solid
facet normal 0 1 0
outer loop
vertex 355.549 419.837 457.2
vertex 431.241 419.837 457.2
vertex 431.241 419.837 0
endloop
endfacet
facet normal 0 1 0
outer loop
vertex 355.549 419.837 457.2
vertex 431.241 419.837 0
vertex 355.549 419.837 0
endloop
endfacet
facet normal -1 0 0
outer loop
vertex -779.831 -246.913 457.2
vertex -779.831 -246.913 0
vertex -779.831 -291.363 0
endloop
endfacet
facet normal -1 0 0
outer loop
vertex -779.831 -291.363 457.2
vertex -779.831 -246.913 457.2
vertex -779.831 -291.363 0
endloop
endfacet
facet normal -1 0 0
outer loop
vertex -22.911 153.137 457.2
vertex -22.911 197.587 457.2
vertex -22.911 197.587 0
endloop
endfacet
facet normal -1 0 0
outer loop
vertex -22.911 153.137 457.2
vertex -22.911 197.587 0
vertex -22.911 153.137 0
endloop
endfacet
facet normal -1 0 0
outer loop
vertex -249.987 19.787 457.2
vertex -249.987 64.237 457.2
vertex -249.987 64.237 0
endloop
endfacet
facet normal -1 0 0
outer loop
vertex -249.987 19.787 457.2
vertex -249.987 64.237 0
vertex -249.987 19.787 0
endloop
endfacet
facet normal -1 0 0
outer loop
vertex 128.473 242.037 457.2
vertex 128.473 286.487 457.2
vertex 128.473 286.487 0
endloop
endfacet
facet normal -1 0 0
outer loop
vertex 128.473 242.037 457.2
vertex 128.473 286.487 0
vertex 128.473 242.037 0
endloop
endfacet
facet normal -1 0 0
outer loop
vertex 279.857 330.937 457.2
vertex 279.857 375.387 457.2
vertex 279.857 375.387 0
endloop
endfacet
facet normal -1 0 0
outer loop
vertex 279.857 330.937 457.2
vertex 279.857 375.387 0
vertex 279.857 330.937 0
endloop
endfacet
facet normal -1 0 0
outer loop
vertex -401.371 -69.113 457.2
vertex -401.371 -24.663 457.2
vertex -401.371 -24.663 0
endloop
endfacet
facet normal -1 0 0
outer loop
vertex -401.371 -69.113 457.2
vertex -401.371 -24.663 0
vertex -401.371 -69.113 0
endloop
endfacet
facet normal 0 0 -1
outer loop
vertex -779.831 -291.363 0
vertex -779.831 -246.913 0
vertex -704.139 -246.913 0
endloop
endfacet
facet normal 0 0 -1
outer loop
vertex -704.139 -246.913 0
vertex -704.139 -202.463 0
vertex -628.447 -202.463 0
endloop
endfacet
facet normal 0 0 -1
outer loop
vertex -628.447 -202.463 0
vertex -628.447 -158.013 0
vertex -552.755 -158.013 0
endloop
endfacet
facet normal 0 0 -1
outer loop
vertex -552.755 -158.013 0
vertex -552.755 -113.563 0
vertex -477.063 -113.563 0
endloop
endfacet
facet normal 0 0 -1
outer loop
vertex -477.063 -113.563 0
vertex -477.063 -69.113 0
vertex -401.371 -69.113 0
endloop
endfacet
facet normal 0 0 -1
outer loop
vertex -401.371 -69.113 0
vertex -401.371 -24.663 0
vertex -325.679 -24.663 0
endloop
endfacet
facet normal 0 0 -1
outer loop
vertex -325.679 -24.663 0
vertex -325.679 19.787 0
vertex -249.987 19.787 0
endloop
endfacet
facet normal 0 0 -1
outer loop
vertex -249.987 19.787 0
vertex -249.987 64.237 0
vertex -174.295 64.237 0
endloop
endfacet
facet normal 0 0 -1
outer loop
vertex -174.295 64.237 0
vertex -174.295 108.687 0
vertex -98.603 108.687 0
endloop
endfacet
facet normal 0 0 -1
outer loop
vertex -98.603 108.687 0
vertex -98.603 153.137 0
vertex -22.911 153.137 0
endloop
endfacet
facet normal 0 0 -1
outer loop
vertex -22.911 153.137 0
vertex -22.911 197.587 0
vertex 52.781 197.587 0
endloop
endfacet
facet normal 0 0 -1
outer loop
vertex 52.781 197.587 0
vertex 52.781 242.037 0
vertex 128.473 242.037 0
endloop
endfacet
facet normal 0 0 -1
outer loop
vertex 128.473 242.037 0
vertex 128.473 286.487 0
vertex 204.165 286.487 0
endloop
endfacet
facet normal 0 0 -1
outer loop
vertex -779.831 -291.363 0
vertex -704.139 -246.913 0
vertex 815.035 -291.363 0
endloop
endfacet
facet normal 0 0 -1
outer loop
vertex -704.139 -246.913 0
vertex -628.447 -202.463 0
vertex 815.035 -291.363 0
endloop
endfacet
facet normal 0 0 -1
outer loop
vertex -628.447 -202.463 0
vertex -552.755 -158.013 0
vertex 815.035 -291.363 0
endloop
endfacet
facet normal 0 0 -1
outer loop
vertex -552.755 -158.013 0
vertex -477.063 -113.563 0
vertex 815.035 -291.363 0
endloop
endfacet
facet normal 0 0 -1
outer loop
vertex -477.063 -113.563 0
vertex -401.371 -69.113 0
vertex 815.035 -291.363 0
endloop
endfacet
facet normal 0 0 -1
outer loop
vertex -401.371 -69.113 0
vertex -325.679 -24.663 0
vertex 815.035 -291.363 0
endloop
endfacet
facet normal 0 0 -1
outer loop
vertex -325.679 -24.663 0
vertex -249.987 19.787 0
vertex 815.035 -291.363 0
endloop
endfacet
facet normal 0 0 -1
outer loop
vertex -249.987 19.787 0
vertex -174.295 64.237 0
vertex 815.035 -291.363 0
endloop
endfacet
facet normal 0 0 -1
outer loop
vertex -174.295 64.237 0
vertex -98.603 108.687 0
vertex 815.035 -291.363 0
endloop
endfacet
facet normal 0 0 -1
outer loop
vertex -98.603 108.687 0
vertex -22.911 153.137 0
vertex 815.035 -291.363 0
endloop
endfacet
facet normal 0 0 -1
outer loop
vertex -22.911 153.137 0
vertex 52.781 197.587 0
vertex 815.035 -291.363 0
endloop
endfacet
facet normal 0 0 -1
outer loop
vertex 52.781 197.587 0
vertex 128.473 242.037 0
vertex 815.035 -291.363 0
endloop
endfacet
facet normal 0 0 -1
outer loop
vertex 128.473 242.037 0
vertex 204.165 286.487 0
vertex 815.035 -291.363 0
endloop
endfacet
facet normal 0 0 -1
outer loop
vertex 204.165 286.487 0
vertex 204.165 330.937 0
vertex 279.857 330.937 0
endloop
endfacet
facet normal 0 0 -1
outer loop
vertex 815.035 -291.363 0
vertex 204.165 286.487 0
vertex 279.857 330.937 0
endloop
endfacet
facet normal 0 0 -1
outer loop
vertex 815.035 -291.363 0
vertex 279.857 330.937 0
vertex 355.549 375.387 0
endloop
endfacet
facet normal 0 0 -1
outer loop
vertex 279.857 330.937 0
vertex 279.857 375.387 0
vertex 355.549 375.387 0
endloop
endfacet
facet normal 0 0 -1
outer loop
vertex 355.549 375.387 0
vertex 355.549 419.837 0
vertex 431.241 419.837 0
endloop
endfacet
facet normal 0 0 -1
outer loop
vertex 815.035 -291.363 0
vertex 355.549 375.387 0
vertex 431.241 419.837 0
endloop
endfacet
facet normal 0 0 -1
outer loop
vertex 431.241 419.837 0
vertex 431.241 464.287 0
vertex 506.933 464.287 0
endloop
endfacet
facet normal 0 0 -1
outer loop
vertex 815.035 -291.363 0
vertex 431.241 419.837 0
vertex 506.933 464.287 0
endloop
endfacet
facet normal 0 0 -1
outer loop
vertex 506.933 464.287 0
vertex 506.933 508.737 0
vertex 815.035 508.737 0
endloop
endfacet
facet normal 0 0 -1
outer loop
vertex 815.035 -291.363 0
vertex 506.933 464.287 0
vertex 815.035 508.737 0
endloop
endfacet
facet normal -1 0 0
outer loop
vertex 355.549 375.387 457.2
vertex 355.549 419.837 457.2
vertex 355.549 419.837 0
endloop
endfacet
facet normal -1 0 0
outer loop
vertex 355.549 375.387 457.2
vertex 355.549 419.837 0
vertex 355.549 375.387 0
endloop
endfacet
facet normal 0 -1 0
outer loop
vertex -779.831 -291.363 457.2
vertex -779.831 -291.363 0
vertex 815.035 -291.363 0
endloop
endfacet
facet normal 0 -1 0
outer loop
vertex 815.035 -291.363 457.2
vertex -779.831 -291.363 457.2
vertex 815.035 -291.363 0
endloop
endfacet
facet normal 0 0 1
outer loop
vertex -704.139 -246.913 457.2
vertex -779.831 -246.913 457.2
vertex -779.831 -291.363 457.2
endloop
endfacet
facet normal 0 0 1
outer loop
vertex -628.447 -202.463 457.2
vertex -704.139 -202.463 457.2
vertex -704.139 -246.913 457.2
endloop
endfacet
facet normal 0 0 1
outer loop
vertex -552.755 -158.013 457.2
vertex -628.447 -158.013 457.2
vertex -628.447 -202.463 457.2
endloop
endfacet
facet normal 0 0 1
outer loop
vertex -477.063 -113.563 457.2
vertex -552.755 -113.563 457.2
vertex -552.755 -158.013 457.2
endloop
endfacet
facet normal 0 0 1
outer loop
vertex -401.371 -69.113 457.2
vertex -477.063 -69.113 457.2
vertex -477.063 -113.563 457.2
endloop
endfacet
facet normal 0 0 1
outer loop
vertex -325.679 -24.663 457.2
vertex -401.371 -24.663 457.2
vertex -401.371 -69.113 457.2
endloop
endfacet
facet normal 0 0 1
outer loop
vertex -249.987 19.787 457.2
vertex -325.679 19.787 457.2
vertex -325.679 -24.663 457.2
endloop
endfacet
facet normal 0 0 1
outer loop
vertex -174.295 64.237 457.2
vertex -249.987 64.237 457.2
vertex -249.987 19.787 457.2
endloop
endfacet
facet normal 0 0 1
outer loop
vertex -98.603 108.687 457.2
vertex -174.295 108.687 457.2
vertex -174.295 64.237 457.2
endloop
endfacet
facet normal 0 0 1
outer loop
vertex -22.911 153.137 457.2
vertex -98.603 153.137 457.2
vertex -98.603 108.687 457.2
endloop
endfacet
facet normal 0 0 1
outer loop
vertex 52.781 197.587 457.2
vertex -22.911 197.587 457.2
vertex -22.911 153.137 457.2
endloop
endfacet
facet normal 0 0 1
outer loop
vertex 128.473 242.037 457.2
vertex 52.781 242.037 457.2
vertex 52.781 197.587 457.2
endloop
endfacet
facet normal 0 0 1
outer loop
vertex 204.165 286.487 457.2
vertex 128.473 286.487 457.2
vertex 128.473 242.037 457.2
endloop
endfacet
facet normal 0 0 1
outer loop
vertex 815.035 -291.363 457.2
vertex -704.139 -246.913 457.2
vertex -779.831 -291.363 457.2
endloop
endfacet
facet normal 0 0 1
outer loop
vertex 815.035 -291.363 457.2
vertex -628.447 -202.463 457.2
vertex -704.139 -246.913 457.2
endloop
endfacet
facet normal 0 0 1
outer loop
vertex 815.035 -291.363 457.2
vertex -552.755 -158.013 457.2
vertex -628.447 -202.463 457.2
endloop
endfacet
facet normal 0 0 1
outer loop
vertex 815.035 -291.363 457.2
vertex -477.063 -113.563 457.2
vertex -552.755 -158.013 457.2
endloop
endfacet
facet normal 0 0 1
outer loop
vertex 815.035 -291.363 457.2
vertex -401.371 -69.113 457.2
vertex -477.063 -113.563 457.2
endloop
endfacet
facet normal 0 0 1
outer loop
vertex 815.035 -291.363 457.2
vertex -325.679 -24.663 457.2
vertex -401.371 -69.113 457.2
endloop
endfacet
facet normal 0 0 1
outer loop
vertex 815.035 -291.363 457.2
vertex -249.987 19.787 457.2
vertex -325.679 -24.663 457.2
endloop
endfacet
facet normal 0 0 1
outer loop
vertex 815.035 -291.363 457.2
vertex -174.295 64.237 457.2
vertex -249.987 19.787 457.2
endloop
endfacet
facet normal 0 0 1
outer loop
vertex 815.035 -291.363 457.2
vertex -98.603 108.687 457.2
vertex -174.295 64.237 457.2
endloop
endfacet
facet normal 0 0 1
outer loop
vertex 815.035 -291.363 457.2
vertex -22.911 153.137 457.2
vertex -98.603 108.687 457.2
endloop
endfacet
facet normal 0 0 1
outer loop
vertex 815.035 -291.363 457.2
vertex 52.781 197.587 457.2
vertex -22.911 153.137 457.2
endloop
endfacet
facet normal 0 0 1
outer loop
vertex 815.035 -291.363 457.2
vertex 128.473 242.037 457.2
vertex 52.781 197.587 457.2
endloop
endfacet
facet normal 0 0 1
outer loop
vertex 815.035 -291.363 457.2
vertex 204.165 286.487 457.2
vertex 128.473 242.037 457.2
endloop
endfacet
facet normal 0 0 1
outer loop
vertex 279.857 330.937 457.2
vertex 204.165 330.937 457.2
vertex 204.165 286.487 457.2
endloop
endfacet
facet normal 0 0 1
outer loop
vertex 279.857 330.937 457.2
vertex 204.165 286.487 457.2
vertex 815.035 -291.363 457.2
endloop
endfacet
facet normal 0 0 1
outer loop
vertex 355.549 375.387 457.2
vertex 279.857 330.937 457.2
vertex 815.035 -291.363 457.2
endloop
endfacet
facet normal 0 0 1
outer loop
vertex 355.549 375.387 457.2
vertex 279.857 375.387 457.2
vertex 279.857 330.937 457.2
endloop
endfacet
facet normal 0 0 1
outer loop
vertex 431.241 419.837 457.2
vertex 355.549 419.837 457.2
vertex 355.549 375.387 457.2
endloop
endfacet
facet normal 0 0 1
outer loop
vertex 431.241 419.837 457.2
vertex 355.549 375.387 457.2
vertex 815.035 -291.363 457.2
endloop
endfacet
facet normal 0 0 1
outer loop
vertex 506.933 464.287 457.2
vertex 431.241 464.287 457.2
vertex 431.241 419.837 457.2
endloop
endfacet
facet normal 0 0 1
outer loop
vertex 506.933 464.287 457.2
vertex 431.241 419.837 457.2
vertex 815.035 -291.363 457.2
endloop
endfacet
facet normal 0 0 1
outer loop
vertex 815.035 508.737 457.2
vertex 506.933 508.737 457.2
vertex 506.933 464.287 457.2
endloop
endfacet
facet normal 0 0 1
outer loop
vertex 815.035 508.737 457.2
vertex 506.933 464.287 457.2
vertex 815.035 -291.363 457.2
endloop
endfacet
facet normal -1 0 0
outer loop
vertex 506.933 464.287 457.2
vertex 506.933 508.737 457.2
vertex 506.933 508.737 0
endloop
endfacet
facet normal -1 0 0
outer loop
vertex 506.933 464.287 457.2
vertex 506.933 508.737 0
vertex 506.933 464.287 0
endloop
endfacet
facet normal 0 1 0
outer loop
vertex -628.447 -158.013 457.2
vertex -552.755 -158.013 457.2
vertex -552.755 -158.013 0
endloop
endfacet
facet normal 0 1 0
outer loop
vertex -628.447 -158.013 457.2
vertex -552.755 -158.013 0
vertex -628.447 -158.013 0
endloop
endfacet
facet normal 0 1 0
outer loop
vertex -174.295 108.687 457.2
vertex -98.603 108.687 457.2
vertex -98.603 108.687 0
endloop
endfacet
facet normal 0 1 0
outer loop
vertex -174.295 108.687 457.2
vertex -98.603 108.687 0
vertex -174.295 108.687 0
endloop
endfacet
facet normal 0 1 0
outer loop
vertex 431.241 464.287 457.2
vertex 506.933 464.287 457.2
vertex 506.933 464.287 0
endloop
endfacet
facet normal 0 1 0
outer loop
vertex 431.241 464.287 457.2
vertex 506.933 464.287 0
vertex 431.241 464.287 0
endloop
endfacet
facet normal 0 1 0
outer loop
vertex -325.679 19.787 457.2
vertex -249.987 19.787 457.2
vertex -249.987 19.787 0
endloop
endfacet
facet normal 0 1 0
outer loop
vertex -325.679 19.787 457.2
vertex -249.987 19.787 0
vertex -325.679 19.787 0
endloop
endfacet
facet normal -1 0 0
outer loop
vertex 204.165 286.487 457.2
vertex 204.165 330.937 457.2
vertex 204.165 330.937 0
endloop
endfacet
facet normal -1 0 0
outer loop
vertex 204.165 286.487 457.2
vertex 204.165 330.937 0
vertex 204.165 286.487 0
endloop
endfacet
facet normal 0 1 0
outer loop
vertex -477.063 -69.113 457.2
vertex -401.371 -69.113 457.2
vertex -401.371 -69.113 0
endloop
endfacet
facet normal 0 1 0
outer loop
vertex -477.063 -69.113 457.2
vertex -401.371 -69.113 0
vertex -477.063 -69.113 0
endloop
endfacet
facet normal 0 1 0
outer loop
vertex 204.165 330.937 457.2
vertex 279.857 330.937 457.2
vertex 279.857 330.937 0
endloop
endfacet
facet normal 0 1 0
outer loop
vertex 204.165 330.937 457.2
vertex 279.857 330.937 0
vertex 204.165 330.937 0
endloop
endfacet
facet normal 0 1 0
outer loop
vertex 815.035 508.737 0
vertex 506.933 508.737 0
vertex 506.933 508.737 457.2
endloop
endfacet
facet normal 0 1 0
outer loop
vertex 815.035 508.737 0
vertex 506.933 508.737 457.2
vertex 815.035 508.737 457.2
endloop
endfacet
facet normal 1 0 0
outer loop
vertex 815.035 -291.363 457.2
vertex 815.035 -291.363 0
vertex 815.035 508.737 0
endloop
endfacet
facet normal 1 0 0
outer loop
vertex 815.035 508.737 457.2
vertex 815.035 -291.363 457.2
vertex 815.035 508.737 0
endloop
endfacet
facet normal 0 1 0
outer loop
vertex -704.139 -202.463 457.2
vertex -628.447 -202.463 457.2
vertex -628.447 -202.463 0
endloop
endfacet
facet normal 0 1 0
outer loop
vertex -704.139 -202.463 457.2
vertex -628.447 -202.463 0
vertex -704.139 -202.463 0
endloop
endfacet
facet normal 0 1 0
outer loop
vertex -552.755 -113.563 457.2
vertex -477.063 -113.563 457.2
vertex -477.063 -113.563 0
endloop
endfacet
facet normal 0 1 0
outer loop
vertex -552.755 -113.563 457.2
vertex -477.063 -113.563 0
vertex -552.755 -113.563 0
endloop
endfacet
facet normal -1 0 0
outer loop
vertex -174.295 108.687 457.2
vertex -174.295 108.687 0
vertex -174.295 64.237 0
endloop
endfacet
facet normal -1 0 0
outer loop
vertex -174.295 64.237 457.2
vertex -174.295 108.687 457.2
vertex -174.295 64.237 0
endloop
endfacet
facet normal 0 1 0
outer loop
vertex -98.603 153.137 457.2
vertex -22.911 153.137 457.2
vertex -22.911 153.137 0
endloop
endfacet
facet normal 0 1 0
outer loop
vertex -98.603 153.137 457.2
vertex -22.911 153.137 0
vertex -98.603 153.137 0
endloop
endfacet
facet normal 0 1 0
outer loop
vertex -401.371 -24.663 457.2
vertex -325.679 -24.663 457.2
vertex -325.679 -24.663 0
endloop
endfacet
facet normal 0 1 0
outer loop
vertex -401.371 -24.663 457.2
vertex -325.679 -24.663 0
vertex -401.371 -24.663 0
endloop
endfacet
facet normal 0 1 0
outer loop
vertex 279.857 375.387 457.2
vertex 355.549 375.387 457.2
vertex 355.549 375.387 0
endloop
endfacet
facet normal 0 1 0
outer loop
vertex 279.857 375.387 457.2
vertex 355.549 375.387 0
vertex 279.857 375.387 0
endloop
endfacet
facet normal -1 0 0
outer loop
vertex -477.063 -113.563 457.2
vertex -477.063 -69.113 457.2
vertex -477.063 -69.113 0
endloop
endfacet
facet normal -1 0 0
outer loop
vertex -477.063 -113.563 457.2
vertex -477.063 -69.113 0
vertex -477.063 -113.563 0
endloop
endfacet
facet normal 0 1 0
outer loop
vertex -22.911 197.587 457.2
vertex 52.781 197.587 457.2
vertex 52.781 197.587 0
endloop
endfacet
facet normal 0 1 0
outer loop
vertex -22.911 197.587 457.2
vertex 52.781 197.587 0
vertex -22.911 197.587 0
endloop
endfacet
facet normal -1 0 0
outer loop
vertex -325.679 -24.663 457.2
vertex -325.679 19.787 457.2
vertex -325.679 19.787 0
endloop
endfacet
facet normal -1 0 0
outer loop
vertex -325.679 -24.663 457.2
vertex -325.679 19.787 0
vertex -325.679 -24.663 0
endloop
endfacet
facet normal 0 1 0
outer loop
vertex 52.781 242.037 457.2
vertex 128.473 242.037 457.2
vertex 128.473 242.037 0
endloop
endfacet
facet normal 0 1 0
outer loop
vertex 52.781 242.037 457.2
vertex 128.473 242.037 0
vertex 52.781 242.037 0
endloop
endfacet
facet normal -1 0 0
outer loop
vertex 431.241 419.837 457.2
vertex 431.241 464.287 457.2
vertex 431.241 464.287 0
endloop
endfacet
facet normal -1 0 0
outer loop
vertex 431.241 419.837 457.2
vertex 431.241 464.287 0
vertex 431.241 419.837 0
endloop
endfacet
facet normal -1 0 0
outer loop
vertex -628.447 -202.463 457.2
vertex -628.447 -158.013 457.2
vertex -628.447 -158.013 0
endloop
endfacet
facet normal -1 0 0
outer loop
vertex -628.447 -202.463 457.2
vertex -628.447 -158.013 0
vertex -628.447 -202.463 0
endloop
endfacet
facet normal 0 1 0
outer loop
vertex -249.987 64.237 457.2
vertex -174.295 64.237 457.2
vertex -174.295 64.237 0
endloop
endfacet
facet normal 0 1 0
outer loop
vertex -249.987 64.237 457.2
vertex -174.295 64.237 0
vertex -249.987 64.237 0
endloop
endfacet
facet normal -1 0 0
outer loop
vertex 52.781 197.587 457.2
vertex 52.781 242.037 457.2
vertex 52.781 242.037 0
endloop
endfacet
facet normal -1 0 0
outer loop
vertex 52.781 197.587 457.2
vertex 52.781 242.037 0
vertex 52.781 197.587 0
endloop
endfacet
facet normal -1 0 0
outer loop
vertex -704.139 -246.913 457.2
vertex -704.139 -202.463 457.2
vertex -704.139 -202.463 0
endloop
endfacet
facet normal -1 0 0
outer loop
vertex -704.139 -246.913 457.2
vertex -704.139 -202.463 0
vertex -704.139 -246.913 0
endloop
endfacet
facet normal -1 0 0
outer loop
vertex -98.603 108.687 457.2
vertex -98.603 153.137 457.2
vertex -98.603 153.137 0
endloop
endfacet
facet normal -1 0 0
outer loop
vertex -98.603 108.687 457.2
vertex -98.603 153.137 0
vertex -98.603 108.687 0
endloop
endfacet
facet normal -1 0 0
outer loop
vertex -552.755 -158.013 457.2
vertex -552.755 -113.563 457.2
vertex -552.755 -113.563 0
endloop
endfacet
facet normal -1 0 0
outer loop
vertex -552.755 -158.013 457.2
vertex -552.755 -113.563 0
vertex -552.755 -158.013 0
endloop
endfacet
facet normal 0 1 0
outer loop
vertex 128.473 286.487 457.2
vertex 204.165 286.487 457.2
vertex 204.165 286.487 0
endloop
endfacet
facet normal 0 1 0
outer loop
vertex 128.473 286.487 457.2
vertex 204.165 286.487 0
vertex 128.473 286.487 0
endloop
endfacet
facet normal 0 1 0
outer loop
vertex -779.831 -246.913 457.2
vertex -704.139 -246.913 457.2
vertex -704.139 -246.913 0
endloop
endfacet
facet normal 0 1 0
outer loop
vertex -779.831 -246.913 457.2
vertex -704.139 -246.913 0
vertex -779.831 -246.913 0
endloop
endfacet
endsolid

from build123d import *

# Parameters (mm, degrees)
SKETCH1_W           = 1670.558
SKETCH1_H           = 800.1
BOSS_EXTRUDE1_DEPTH = 457.2
CUT_EXTRUDE1_DEPTH  = 457.2


with BuildPart() as part:
    # Sketch1 → Boss-Extrude1 (new body)
    with BuildSketch(Plane.XY):
        with Locations((-20.24385353, 108.686840885)):
            Rectangle(SKETCH1_W, SKETCH1_H)
    extrude(amount=BOSS_EXTRUDE1_DEPTH)

    # Sketch2 → Cut-Extrude1 (cut)
    with BuildSketch(Plane.XY.offset(457.2)):
        Polygon((506.93314647, 508.736840885), (506.93314647, 464.286840885), (431.24114647, 464.286840885), (431.24114647, 419.836840885), (355.54914647, 419.836840885), (355.54914647, 375.386840885), (279.85714647, 375.386840885), (279.85714647, 330.936840885), (204.16514647, 330.936840885), (204.16514647, 286.486840885), (128.47314647, 286.486840885), (128.47314647, 242.036840885), (52.78114647, 242.036840885), (52.78114647, 197.586840885), (-22.91085353, 197.586840885), (-22.91085353, 153.136840885), (-98.60285353, 153.136840885), (-98.60285353, 108.686840885), (-174.29485353, 108.686840885), (-174.29485353, 64.236840885), (-249.98685353, 64.236840885), (-249.98685353, 19.786840885), (-325.67885353, 19.786840885), (-325.67885353, -24.663159115), (-401.37085353, -24.663159115), (-401.37085353, -69.113159115), (-477.06285353, -69.113159115), (-477.06285353, -113.563159115), (-552.75485353, -113.563159115), (-552.75485353, -158.013159115), (-628.44685353, -158.013159115), (-628.44685353, -202.463159115), (-704.13885353, -202.463159115), (-704.13885353, -246.913159115), (-779.83085353, -246.913159115), (-779.83085353, -291.363159115), (-855.52285353, -291.363159115), (-855.52285353, 508.736840885), align=None)
    extrude(amount=-CUT_EXTRUDE1_DEPTH, mode=Mode.SUBTRACT)


solid = part.part
